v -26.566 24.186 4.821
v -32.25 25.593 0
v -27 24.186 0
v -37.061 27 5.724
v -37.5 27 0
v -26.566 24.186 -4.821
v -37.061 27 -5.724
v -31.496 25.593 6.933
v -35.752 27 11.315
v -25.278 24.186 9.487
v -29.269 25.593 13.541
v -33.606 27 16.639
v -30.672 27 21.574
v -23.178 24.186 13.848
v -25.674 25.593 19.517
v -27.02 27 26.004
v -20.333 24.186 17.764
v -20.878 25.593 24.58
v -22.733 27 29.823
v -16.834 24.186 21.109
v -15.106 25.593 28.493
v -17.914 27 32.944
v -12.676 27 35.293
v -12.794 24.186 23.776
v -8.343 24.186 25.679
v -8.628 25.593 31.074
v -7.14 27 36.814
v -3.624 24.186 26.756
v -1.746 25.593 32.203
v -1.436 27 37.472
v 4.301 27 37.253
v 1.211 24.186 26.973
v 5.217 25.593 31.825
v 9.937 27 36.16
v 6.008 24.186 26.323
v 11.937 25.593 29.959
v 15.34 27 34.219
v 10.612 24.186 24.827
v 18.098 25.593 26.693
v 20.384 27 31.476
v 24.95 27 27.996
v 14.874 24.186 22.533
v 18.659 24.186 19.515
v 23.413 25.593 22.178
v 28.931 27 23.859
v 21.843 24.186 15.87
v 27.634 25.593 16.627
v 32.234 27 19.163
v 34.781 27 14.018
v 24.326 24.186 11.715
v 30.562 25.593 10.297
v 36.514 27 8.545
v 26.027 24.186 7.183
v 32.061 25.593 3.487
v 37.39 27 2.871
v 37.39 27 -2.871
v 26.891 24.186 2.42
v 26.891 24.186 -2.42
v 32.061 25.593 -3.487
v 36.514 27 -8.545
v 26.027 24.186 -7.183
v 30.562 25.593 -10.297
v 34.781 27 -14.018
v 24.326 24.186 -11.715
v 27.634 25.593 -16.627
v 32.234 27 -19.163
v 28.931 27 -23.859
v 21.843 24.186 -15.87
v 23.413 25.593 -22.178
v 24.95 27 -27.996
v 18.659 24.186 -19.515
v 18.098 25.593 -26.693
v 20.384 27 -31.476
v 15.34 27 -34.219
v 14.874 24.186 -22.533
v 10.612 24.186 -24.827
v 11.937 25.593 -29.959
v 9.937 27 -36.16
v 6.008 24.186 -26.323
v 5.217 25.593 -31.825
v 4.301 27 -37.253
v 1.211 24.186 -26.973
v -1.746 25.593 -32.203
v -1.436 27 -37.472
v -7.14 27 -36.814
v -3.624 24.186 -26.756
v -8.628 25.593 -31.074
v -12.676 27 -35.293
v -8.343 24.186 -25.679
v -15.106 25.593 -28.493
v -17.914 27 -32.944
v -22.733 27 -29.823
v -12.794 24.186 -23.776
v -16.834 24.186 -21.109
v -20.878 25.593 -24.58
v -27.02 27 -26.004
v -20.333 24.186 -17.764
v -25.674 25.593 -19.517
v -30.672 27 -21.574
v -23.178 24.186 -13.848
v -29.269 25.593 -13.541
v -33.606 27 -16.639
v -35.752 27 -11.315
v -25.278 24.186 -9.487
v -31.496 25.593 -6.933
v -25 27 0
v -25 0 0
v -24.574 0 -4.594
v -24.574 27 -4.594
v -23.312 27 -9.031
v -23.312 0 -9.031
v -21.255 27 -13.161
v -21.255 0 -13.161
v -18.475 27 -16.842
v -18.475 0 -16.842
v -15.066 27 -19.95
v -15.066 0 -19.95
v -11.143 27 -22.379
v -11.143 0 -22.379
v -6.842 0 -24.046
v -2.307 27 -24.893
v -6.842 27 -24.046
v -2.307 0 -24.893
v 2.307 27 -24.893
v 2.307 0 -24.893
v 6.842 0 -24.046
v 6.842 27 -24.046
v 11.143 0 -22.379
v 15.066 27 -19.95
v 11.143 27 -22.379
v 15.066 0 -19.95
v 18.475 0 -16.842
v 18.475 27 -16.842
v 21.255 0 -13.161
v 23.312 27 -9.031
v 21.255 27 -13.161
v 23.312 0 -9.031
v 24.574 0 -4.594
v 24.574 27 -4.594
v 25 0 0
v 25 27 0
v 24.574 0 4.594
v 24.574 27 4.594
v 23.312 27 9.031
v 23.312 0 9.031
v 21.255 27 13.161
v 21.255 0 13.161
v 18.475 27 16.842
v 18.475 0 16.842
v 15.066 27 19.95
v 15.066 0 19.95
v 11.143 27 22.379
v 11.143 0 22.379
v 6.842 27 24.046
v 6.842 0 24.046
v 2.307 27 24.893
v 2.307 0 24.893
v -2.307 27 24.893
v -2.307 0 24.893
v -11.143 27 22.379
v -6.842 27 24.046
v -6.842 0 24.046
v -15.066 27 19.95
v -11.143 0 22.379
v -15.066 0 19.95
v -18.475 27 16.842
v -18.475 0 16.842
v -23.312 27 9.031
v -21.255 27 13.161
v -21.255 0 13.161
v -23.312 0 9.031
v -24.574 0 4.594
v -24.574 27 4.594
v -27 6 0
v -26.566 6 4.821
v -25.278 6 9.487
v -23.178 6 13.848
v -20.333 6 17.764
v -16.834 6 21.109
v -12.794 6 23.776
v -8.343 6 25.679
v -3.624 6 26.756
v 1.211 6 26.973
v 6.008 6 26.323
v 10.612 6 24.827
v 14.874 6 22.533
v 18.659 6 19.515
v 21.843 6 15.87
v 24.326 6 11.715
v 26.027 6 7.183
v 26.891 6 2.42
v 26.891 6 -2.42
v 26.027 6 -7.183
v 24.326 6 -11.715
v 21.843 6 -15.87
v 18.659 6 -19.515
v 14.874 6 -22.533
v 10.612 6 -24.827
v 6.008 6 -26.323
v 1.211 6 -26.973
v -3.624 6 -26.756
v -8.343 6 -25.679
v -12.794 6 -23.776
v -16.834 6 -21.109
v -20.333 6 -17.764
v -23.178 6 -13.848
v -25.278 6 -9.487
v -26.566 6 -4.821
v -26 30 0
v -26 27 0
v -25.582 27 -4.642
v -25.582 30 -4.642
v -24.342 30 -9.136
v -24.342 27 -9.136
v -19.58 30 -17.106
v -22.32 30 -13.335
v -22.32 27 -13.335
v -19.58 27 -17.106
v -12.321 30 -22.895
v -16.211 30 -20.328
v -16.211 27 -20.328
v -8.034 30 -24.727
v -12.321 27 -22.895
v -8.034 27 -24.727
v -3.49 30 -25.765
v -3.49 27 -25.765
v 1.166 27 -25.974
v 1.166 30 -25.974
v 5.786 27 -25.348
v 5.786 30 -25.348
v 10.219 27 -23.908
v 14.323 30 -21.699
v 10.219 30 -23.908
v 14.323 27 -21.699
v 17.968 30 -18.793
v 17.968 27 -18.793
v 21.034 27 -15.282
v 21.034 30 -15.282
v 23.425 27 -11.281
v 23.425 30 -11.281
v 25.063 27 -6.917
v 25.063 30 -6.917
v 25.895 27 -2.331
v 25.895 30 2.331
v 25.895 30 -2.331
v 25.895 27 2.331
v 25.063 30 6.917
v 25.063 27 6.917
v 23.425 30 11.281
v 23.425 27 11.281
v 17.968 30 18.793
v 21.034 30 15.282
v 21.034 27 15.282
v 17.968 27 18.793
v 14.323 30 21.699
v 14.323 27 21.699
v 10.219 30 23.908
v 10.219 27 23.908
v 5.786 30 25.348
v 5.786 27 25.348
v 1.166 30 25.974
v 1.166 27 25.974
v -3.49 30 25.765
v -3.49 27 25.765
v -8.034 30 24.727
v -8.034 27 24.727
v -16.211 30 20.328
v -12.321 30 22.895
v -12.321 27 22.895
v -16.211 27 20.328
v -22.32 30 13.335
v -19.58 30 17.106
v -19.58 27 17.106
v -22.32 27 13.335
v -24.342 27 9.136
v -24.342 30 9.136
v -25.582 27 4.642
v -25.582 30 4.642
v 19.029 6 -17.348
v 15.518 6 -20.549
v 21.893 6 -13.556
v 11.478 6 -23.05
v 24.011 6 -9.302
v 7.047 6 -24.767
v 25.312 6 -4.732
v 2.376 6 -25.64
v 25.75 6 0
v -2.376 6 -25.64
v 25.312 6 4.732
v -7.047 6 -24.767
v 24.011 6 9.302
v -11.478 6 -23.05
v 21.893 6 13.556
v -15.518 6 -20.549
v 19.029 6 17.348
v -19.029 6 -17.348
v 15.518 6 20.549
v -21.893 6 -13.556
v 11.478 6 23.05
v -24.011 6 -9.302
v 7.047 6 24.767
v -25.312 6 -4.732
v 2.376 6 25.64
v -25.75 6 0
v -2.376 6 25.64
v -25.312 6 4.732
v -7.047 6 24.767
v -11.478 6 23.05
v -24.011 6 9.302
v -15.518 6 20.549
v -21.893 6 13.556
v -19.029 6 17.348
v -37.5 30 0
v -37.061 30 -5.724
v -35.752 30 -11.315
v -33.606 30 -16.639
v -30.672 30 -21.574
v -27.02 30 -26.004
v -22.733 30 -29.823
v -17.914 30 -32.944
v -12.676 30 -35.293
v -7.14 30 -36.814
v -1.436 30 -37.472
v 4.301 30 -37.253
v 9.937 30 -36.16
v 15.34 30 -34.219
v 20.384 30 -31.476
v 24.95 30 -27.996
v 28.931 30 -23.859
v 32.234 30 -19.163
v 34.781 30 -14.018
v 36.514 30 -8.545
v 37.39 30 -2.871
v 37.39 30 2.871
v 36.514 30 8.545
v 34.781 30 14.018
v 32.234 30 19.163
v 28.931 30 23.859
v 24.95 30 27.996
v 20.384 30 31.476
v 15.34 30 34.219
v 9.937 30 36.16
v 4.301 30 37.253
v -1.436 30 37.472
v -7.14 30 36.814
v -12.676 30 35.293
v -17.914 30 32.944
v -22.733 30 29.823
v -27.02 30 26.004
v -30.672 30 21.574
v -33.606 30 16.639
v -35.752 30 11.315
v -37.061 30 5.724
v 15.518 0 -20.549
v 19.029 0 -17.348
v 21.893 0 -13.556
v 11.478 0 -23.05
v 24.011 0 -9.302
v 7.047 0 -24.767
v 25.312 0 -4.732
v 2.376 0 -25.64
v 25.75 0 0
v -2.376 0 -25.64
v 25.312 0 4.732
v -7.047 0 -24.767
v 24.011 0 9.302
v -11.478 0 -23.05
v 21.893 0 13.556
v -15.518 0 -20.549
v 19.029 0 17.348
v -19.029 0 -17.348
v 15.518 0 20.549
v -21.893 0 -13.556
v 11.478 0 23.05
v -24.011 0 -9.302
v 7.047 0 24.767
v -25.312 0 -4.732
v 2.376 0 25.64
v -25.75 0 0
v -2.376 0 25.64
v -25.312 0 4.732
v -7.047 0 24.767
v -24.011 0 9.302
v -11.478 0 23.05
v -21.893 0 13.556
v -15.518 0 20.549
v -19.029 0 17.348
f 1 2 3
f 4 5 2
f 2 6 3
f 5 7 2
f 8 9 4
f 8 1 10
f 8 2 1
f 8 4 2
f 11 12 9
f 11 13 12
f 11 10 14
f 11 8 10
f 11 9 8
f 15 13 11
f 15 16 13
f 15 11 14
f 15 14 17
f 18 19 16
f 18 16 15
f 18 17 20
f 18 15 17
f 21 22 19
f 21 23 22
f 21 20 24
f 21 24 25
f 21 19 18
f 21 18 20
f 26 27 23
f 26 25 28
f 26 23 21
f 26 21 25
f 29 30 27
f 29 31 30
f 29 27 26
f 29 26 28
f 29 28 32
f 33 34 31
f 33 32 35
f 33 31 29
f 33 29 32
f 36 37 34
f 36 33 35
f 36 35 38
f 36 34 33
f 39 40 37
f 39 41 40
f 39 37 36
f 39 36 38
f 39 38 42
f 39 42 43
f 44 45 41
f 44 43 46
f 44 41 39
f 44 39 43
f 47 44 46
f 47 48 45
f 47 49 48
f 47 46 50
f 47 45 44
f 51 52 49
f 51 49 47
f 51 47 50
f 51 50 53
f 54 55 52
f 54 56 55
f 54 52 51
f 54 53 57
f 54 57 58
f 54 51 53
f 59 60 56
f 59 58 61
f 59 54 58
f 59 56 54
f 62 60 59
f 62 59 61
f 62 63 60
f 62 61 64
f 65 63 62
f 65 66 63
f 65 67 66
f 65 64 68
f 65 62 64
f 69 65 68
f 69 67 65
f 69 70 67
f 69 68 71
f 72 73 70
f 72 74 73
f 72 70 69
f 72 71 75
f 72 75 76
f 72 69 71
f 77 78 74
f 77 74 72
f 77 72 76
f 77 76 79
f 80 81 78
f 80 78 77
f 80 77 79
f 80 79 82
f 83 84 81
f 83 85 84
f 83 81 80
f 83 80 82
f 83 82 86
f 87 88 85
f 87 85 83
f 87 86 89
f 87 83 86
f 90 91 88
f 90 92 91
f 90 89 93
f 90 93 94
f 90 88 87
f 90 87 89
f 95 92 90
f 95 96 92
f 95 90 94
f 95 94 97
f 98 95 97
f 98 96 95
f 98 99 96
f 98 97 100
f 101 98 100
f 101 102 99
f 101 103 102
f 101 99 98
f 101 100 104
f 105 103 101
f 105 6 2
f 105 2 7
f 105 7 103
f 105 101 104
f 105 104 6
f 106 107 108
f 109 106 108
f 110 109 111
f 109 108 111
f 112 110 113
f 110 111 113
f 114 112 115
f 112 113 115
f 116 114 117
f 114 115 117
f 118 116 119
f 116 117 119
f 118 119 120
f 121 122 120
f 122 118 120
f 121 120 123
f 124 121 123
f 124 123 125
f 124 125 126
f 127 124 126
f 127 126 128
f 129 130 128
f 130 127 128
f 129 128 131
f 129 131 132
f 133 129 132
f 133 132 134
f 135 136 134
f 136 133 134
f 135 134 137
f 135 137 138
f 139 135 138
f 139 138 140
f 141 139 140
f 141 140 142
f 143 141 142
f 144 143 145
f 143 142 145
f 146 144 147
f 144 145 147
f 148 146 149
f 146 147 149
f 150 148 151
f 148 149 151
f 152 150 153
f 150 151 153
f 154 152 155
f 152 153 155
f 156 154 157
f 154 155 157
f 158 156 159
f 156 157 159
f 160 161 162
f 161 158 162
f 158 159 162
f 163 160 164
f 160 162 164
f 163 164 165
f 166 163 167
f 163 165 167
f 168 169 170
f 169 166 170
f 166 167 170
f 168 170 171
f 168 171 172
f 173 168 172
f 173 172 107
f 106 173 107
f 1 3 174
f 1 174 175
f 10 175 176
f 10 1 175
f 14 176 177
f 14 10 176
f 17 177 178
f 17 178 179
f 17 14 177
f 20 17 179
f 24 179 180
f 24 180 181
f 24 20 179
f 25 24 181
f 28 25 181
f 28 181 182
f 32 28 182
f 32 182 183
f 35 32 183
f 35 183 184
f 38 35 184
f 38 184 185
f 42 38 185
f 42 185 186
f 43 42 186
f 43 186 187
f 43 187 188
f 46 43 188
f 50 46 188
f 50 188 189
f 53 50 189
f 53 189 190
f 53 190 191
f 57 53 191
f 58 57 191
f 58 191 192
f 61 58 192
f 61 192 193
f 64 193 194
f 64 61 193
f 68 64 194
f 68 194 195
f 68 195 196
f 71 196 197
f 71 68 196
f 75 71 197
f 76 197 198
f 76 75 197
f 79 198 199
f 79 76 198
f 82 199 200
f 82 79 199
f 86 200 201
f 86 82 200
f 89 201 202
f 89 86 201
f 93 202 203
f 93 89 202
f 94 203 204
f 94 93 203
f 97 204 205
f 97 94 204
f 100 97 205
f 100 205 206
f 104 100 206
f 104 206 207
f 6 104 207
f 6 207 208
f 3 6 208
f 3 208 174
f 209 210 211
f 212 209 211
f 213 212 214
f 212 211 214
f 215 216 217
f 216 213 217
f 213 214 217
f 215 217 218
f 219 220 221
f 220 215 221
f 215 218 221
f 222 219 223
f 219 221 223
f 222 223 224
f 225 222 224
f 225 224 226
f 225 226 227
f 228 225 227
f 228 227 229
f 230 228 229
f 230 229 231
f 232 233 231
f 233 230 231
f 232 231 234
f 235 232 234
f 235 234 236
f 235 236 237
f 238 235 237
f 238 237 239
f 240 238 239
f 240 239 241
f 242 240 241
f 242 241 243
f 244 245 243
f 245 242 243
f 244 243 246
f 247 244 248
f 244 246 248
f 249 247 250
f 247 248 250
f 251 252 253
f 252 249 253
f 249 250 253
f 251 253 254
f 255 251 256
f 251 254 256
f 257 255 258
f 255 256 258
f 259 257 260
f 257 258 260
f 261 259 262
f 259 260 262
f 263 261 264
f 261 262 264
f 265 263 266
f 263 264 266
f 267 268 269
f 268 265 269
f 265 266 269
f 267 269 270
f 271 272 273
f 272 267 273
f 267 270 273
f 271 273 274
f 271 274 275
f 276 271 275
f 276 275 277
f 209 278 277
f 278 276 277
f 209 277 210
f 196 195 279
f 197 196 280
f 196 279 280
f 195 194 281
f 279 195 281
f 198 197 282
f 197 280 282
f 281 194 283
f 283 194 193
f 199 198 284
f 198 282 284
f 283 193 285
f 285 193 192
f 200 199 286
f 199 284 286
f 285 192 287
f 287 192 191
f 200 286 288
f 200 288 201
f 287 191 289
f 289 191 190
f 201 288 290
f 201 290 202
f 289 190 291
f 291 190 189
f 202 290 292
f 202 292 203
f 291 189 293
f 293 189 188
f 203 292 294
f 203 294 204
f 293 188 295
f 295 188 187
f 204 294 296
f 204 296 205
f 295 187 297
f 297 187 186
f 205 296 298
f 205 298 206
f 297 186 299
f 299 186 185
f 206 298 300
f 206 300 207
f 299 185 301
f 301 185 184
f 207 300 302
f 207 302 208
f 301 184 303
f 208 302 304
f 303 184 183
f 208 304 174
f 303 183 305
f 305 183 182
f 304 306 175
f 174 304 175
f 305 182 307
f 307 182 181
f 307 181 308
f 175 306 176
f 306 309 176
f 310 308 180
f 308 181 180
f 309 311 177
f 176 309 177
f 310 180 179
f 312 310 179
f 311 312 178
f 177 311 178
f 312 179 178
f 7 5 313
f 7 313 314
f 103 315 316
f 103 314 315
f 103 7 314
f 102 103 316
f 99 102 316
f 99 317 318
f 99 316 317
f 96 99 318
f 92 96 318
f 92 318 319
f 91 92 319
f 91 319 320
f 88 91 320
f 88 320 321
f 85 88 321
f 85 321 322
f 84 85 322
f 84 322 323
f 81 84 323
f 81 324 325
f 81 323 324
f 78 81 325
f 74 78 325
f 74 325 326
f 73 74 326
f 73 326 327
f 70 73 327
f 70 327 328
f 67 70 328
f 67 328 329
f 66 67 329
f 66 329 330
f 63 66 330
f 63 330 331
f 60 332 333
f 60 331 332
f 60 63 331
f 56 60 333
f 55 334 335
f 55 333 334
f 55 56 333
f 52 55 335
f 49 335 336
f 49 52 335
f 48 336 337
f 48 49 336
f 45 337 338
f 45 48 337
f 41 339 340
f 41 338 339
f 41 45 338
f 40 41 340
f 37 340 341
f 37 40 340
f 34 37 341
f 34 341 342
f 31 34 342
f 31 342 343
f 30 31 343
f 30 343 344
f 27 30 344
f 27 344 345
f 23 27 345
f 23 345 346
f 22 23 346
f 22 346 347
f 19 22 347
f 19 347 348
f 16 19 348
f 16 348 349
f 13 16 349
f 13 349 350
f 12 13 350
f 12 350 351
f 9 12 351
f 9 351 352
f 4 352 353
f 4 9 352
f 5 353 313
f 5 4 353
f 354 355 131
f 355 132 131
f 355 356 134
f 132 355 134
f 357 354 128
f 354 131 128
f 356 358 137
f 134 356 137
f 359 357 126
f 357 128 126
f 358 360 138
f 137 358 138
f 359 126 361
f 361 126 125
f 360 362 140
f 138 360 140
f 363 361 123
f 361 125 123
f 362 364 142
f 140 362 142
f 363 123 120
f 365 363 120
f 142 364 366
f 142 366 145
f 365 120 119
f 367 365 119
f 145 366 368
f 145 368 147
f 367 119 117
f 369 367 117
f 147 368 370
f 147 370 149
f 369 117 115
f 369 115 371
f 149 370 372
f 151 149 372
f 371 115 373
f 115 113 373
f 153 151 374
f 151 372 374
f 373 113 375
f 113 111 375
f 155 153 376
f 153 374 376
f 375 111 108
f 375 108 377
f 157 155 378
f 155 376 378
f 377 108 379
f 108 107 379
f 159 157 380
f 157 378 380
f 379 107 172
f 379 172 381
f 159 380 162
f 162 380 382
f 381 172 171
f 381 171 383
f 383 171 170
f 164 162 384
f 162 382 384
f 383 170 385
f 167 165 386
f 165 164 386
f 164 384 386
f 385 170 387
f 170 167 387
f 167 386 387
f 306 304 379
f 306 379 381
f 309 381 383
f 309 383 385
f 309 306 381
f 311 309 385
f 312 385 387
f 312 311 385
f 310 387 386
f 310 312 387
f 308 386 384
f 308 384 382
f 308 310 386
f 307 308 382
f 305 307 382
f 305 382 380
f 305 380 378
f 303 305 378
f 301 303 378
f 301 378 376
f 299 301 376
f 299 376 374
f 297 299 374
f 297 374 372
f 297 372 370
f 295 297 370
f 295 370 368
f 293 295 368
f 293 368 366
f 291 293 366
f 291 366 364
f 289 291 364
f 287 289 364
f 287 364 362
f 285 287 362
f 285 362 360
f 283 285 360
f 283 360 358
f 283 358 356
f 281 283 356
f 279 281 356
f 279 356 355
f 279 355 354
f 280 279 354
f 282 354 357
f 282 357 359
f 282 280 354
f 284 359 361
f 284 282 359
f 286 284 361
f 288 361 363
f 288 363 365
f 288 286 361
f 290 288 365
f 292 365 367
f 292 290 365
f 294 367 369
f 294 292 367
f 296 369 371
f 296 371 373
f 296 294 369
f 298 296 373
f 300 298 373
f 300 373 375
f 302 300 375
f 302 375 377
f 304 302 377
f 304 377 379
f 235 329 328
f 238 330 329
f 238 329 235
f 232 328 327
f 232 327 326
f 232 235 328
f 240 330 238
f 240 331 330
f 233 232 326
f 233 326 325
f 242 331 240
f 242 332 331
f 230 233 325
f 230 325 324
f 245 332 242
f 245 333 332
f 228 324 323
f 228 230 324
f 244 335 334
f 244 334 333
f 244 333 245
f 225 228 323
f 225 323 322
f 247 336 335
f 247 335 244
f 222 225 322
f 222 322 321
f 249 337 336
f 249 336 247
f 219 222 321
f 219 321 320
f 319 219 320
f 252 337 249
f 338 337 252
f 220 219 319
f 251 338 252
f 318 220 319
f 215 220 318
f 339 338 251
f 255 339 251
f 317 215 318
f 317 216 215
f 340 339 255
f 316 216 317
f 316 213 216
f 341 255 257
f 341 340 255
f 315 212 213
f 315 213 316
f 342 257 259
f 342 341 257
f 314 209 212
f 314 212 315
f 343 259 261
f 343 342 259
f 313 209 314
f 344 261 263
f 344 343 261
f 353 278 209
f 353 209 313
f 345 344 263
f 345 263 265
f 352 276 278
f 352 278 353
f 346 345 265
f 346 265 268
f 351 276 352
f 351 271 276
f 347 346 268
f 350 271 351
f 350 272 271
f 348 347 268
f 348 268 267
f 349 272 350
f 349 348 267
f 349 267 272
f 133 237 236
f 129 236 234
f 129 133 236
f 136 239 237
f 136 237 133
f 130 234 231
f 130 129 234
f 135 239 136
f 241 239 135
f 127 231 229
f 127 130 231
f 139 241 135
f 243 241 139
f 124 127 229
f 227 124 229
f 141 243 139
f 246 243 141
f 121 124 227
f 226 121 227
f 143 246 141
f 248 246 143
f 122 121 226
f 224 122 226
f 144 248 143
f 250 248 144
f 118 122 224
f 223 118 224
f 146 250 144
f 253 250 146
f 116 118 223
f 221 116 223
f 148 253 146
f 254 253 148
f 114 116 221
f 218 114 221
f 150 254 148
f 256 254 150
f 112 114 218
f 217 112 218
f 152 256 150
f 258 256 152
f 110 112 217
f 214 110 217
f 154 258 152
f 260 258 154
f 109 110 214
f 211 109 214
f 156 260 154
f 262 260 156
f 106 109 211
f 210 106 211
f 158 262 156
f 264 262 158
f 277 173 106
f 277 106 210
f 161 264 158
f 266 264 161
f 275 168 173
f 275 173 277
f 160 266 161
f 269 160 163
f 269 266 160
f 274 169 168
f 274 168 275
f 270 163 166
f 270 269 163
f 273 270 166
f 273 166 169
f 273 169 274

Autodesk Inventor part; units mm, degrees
ref_plane "YZ Plane" through (0, 0, 0) normal (1, 0, 0) x (0, 1, 0)
ref_plane "XZ Plane" through (0, 0, 0) normal (0, 1, 0) x (-1, 0, 0)
ref_plane "XY Plane" through (0, 0, 0) normal (0, 0, 1) x (1, 0, 0)
sketch "Sketch1" plane through (0, 0, 0) normal (0, 0, 1) x (1, 0, 0)
  line L0 (-25, 27) -> (-25, 0)
  line L1 (-25, 0) -> (-25.75, 0)
  line L2 (-25.75, 0) -> (-25.75, 6)
  line L3 (-25.75, 6) -> (-27, 6)
  line L4 (-27, 6) -> (-27, 24.1865)
  line L5 (-37.5, 30) -> (-26, 30)
  line L6 (-26, 30) -> (-26, 27)
  line L7 (-26, 27) -> (-25, 27)
  line L8 (0, -6) -> (0, 36) projected
  line L9 (-37.5, 30) -> (-37.5, 27)
  line L10 (-37.5, 27) -> (-27, 24.1865)
  point P0 (0, 0)
  dimension "d0" = 25.75
  dimension "neck_ir" = 25
  dimension "d5" = 6
  dimension "d15" = 27
  dimension "d16" = 3
  dimension "d17" = 37.5
  dimension "d18" = 26
  dimension "d19" = 15
  dimension "d20" = 3
  dimension "d21" = 30
revolve "Revolution1" add sketch "Sketch1" angle 360 about axis through (0, -10, 0) along (0, 1, 0)
equation "\"oring_diameter\" = 4"
properties part number "neckForStorage" material "Brass"
